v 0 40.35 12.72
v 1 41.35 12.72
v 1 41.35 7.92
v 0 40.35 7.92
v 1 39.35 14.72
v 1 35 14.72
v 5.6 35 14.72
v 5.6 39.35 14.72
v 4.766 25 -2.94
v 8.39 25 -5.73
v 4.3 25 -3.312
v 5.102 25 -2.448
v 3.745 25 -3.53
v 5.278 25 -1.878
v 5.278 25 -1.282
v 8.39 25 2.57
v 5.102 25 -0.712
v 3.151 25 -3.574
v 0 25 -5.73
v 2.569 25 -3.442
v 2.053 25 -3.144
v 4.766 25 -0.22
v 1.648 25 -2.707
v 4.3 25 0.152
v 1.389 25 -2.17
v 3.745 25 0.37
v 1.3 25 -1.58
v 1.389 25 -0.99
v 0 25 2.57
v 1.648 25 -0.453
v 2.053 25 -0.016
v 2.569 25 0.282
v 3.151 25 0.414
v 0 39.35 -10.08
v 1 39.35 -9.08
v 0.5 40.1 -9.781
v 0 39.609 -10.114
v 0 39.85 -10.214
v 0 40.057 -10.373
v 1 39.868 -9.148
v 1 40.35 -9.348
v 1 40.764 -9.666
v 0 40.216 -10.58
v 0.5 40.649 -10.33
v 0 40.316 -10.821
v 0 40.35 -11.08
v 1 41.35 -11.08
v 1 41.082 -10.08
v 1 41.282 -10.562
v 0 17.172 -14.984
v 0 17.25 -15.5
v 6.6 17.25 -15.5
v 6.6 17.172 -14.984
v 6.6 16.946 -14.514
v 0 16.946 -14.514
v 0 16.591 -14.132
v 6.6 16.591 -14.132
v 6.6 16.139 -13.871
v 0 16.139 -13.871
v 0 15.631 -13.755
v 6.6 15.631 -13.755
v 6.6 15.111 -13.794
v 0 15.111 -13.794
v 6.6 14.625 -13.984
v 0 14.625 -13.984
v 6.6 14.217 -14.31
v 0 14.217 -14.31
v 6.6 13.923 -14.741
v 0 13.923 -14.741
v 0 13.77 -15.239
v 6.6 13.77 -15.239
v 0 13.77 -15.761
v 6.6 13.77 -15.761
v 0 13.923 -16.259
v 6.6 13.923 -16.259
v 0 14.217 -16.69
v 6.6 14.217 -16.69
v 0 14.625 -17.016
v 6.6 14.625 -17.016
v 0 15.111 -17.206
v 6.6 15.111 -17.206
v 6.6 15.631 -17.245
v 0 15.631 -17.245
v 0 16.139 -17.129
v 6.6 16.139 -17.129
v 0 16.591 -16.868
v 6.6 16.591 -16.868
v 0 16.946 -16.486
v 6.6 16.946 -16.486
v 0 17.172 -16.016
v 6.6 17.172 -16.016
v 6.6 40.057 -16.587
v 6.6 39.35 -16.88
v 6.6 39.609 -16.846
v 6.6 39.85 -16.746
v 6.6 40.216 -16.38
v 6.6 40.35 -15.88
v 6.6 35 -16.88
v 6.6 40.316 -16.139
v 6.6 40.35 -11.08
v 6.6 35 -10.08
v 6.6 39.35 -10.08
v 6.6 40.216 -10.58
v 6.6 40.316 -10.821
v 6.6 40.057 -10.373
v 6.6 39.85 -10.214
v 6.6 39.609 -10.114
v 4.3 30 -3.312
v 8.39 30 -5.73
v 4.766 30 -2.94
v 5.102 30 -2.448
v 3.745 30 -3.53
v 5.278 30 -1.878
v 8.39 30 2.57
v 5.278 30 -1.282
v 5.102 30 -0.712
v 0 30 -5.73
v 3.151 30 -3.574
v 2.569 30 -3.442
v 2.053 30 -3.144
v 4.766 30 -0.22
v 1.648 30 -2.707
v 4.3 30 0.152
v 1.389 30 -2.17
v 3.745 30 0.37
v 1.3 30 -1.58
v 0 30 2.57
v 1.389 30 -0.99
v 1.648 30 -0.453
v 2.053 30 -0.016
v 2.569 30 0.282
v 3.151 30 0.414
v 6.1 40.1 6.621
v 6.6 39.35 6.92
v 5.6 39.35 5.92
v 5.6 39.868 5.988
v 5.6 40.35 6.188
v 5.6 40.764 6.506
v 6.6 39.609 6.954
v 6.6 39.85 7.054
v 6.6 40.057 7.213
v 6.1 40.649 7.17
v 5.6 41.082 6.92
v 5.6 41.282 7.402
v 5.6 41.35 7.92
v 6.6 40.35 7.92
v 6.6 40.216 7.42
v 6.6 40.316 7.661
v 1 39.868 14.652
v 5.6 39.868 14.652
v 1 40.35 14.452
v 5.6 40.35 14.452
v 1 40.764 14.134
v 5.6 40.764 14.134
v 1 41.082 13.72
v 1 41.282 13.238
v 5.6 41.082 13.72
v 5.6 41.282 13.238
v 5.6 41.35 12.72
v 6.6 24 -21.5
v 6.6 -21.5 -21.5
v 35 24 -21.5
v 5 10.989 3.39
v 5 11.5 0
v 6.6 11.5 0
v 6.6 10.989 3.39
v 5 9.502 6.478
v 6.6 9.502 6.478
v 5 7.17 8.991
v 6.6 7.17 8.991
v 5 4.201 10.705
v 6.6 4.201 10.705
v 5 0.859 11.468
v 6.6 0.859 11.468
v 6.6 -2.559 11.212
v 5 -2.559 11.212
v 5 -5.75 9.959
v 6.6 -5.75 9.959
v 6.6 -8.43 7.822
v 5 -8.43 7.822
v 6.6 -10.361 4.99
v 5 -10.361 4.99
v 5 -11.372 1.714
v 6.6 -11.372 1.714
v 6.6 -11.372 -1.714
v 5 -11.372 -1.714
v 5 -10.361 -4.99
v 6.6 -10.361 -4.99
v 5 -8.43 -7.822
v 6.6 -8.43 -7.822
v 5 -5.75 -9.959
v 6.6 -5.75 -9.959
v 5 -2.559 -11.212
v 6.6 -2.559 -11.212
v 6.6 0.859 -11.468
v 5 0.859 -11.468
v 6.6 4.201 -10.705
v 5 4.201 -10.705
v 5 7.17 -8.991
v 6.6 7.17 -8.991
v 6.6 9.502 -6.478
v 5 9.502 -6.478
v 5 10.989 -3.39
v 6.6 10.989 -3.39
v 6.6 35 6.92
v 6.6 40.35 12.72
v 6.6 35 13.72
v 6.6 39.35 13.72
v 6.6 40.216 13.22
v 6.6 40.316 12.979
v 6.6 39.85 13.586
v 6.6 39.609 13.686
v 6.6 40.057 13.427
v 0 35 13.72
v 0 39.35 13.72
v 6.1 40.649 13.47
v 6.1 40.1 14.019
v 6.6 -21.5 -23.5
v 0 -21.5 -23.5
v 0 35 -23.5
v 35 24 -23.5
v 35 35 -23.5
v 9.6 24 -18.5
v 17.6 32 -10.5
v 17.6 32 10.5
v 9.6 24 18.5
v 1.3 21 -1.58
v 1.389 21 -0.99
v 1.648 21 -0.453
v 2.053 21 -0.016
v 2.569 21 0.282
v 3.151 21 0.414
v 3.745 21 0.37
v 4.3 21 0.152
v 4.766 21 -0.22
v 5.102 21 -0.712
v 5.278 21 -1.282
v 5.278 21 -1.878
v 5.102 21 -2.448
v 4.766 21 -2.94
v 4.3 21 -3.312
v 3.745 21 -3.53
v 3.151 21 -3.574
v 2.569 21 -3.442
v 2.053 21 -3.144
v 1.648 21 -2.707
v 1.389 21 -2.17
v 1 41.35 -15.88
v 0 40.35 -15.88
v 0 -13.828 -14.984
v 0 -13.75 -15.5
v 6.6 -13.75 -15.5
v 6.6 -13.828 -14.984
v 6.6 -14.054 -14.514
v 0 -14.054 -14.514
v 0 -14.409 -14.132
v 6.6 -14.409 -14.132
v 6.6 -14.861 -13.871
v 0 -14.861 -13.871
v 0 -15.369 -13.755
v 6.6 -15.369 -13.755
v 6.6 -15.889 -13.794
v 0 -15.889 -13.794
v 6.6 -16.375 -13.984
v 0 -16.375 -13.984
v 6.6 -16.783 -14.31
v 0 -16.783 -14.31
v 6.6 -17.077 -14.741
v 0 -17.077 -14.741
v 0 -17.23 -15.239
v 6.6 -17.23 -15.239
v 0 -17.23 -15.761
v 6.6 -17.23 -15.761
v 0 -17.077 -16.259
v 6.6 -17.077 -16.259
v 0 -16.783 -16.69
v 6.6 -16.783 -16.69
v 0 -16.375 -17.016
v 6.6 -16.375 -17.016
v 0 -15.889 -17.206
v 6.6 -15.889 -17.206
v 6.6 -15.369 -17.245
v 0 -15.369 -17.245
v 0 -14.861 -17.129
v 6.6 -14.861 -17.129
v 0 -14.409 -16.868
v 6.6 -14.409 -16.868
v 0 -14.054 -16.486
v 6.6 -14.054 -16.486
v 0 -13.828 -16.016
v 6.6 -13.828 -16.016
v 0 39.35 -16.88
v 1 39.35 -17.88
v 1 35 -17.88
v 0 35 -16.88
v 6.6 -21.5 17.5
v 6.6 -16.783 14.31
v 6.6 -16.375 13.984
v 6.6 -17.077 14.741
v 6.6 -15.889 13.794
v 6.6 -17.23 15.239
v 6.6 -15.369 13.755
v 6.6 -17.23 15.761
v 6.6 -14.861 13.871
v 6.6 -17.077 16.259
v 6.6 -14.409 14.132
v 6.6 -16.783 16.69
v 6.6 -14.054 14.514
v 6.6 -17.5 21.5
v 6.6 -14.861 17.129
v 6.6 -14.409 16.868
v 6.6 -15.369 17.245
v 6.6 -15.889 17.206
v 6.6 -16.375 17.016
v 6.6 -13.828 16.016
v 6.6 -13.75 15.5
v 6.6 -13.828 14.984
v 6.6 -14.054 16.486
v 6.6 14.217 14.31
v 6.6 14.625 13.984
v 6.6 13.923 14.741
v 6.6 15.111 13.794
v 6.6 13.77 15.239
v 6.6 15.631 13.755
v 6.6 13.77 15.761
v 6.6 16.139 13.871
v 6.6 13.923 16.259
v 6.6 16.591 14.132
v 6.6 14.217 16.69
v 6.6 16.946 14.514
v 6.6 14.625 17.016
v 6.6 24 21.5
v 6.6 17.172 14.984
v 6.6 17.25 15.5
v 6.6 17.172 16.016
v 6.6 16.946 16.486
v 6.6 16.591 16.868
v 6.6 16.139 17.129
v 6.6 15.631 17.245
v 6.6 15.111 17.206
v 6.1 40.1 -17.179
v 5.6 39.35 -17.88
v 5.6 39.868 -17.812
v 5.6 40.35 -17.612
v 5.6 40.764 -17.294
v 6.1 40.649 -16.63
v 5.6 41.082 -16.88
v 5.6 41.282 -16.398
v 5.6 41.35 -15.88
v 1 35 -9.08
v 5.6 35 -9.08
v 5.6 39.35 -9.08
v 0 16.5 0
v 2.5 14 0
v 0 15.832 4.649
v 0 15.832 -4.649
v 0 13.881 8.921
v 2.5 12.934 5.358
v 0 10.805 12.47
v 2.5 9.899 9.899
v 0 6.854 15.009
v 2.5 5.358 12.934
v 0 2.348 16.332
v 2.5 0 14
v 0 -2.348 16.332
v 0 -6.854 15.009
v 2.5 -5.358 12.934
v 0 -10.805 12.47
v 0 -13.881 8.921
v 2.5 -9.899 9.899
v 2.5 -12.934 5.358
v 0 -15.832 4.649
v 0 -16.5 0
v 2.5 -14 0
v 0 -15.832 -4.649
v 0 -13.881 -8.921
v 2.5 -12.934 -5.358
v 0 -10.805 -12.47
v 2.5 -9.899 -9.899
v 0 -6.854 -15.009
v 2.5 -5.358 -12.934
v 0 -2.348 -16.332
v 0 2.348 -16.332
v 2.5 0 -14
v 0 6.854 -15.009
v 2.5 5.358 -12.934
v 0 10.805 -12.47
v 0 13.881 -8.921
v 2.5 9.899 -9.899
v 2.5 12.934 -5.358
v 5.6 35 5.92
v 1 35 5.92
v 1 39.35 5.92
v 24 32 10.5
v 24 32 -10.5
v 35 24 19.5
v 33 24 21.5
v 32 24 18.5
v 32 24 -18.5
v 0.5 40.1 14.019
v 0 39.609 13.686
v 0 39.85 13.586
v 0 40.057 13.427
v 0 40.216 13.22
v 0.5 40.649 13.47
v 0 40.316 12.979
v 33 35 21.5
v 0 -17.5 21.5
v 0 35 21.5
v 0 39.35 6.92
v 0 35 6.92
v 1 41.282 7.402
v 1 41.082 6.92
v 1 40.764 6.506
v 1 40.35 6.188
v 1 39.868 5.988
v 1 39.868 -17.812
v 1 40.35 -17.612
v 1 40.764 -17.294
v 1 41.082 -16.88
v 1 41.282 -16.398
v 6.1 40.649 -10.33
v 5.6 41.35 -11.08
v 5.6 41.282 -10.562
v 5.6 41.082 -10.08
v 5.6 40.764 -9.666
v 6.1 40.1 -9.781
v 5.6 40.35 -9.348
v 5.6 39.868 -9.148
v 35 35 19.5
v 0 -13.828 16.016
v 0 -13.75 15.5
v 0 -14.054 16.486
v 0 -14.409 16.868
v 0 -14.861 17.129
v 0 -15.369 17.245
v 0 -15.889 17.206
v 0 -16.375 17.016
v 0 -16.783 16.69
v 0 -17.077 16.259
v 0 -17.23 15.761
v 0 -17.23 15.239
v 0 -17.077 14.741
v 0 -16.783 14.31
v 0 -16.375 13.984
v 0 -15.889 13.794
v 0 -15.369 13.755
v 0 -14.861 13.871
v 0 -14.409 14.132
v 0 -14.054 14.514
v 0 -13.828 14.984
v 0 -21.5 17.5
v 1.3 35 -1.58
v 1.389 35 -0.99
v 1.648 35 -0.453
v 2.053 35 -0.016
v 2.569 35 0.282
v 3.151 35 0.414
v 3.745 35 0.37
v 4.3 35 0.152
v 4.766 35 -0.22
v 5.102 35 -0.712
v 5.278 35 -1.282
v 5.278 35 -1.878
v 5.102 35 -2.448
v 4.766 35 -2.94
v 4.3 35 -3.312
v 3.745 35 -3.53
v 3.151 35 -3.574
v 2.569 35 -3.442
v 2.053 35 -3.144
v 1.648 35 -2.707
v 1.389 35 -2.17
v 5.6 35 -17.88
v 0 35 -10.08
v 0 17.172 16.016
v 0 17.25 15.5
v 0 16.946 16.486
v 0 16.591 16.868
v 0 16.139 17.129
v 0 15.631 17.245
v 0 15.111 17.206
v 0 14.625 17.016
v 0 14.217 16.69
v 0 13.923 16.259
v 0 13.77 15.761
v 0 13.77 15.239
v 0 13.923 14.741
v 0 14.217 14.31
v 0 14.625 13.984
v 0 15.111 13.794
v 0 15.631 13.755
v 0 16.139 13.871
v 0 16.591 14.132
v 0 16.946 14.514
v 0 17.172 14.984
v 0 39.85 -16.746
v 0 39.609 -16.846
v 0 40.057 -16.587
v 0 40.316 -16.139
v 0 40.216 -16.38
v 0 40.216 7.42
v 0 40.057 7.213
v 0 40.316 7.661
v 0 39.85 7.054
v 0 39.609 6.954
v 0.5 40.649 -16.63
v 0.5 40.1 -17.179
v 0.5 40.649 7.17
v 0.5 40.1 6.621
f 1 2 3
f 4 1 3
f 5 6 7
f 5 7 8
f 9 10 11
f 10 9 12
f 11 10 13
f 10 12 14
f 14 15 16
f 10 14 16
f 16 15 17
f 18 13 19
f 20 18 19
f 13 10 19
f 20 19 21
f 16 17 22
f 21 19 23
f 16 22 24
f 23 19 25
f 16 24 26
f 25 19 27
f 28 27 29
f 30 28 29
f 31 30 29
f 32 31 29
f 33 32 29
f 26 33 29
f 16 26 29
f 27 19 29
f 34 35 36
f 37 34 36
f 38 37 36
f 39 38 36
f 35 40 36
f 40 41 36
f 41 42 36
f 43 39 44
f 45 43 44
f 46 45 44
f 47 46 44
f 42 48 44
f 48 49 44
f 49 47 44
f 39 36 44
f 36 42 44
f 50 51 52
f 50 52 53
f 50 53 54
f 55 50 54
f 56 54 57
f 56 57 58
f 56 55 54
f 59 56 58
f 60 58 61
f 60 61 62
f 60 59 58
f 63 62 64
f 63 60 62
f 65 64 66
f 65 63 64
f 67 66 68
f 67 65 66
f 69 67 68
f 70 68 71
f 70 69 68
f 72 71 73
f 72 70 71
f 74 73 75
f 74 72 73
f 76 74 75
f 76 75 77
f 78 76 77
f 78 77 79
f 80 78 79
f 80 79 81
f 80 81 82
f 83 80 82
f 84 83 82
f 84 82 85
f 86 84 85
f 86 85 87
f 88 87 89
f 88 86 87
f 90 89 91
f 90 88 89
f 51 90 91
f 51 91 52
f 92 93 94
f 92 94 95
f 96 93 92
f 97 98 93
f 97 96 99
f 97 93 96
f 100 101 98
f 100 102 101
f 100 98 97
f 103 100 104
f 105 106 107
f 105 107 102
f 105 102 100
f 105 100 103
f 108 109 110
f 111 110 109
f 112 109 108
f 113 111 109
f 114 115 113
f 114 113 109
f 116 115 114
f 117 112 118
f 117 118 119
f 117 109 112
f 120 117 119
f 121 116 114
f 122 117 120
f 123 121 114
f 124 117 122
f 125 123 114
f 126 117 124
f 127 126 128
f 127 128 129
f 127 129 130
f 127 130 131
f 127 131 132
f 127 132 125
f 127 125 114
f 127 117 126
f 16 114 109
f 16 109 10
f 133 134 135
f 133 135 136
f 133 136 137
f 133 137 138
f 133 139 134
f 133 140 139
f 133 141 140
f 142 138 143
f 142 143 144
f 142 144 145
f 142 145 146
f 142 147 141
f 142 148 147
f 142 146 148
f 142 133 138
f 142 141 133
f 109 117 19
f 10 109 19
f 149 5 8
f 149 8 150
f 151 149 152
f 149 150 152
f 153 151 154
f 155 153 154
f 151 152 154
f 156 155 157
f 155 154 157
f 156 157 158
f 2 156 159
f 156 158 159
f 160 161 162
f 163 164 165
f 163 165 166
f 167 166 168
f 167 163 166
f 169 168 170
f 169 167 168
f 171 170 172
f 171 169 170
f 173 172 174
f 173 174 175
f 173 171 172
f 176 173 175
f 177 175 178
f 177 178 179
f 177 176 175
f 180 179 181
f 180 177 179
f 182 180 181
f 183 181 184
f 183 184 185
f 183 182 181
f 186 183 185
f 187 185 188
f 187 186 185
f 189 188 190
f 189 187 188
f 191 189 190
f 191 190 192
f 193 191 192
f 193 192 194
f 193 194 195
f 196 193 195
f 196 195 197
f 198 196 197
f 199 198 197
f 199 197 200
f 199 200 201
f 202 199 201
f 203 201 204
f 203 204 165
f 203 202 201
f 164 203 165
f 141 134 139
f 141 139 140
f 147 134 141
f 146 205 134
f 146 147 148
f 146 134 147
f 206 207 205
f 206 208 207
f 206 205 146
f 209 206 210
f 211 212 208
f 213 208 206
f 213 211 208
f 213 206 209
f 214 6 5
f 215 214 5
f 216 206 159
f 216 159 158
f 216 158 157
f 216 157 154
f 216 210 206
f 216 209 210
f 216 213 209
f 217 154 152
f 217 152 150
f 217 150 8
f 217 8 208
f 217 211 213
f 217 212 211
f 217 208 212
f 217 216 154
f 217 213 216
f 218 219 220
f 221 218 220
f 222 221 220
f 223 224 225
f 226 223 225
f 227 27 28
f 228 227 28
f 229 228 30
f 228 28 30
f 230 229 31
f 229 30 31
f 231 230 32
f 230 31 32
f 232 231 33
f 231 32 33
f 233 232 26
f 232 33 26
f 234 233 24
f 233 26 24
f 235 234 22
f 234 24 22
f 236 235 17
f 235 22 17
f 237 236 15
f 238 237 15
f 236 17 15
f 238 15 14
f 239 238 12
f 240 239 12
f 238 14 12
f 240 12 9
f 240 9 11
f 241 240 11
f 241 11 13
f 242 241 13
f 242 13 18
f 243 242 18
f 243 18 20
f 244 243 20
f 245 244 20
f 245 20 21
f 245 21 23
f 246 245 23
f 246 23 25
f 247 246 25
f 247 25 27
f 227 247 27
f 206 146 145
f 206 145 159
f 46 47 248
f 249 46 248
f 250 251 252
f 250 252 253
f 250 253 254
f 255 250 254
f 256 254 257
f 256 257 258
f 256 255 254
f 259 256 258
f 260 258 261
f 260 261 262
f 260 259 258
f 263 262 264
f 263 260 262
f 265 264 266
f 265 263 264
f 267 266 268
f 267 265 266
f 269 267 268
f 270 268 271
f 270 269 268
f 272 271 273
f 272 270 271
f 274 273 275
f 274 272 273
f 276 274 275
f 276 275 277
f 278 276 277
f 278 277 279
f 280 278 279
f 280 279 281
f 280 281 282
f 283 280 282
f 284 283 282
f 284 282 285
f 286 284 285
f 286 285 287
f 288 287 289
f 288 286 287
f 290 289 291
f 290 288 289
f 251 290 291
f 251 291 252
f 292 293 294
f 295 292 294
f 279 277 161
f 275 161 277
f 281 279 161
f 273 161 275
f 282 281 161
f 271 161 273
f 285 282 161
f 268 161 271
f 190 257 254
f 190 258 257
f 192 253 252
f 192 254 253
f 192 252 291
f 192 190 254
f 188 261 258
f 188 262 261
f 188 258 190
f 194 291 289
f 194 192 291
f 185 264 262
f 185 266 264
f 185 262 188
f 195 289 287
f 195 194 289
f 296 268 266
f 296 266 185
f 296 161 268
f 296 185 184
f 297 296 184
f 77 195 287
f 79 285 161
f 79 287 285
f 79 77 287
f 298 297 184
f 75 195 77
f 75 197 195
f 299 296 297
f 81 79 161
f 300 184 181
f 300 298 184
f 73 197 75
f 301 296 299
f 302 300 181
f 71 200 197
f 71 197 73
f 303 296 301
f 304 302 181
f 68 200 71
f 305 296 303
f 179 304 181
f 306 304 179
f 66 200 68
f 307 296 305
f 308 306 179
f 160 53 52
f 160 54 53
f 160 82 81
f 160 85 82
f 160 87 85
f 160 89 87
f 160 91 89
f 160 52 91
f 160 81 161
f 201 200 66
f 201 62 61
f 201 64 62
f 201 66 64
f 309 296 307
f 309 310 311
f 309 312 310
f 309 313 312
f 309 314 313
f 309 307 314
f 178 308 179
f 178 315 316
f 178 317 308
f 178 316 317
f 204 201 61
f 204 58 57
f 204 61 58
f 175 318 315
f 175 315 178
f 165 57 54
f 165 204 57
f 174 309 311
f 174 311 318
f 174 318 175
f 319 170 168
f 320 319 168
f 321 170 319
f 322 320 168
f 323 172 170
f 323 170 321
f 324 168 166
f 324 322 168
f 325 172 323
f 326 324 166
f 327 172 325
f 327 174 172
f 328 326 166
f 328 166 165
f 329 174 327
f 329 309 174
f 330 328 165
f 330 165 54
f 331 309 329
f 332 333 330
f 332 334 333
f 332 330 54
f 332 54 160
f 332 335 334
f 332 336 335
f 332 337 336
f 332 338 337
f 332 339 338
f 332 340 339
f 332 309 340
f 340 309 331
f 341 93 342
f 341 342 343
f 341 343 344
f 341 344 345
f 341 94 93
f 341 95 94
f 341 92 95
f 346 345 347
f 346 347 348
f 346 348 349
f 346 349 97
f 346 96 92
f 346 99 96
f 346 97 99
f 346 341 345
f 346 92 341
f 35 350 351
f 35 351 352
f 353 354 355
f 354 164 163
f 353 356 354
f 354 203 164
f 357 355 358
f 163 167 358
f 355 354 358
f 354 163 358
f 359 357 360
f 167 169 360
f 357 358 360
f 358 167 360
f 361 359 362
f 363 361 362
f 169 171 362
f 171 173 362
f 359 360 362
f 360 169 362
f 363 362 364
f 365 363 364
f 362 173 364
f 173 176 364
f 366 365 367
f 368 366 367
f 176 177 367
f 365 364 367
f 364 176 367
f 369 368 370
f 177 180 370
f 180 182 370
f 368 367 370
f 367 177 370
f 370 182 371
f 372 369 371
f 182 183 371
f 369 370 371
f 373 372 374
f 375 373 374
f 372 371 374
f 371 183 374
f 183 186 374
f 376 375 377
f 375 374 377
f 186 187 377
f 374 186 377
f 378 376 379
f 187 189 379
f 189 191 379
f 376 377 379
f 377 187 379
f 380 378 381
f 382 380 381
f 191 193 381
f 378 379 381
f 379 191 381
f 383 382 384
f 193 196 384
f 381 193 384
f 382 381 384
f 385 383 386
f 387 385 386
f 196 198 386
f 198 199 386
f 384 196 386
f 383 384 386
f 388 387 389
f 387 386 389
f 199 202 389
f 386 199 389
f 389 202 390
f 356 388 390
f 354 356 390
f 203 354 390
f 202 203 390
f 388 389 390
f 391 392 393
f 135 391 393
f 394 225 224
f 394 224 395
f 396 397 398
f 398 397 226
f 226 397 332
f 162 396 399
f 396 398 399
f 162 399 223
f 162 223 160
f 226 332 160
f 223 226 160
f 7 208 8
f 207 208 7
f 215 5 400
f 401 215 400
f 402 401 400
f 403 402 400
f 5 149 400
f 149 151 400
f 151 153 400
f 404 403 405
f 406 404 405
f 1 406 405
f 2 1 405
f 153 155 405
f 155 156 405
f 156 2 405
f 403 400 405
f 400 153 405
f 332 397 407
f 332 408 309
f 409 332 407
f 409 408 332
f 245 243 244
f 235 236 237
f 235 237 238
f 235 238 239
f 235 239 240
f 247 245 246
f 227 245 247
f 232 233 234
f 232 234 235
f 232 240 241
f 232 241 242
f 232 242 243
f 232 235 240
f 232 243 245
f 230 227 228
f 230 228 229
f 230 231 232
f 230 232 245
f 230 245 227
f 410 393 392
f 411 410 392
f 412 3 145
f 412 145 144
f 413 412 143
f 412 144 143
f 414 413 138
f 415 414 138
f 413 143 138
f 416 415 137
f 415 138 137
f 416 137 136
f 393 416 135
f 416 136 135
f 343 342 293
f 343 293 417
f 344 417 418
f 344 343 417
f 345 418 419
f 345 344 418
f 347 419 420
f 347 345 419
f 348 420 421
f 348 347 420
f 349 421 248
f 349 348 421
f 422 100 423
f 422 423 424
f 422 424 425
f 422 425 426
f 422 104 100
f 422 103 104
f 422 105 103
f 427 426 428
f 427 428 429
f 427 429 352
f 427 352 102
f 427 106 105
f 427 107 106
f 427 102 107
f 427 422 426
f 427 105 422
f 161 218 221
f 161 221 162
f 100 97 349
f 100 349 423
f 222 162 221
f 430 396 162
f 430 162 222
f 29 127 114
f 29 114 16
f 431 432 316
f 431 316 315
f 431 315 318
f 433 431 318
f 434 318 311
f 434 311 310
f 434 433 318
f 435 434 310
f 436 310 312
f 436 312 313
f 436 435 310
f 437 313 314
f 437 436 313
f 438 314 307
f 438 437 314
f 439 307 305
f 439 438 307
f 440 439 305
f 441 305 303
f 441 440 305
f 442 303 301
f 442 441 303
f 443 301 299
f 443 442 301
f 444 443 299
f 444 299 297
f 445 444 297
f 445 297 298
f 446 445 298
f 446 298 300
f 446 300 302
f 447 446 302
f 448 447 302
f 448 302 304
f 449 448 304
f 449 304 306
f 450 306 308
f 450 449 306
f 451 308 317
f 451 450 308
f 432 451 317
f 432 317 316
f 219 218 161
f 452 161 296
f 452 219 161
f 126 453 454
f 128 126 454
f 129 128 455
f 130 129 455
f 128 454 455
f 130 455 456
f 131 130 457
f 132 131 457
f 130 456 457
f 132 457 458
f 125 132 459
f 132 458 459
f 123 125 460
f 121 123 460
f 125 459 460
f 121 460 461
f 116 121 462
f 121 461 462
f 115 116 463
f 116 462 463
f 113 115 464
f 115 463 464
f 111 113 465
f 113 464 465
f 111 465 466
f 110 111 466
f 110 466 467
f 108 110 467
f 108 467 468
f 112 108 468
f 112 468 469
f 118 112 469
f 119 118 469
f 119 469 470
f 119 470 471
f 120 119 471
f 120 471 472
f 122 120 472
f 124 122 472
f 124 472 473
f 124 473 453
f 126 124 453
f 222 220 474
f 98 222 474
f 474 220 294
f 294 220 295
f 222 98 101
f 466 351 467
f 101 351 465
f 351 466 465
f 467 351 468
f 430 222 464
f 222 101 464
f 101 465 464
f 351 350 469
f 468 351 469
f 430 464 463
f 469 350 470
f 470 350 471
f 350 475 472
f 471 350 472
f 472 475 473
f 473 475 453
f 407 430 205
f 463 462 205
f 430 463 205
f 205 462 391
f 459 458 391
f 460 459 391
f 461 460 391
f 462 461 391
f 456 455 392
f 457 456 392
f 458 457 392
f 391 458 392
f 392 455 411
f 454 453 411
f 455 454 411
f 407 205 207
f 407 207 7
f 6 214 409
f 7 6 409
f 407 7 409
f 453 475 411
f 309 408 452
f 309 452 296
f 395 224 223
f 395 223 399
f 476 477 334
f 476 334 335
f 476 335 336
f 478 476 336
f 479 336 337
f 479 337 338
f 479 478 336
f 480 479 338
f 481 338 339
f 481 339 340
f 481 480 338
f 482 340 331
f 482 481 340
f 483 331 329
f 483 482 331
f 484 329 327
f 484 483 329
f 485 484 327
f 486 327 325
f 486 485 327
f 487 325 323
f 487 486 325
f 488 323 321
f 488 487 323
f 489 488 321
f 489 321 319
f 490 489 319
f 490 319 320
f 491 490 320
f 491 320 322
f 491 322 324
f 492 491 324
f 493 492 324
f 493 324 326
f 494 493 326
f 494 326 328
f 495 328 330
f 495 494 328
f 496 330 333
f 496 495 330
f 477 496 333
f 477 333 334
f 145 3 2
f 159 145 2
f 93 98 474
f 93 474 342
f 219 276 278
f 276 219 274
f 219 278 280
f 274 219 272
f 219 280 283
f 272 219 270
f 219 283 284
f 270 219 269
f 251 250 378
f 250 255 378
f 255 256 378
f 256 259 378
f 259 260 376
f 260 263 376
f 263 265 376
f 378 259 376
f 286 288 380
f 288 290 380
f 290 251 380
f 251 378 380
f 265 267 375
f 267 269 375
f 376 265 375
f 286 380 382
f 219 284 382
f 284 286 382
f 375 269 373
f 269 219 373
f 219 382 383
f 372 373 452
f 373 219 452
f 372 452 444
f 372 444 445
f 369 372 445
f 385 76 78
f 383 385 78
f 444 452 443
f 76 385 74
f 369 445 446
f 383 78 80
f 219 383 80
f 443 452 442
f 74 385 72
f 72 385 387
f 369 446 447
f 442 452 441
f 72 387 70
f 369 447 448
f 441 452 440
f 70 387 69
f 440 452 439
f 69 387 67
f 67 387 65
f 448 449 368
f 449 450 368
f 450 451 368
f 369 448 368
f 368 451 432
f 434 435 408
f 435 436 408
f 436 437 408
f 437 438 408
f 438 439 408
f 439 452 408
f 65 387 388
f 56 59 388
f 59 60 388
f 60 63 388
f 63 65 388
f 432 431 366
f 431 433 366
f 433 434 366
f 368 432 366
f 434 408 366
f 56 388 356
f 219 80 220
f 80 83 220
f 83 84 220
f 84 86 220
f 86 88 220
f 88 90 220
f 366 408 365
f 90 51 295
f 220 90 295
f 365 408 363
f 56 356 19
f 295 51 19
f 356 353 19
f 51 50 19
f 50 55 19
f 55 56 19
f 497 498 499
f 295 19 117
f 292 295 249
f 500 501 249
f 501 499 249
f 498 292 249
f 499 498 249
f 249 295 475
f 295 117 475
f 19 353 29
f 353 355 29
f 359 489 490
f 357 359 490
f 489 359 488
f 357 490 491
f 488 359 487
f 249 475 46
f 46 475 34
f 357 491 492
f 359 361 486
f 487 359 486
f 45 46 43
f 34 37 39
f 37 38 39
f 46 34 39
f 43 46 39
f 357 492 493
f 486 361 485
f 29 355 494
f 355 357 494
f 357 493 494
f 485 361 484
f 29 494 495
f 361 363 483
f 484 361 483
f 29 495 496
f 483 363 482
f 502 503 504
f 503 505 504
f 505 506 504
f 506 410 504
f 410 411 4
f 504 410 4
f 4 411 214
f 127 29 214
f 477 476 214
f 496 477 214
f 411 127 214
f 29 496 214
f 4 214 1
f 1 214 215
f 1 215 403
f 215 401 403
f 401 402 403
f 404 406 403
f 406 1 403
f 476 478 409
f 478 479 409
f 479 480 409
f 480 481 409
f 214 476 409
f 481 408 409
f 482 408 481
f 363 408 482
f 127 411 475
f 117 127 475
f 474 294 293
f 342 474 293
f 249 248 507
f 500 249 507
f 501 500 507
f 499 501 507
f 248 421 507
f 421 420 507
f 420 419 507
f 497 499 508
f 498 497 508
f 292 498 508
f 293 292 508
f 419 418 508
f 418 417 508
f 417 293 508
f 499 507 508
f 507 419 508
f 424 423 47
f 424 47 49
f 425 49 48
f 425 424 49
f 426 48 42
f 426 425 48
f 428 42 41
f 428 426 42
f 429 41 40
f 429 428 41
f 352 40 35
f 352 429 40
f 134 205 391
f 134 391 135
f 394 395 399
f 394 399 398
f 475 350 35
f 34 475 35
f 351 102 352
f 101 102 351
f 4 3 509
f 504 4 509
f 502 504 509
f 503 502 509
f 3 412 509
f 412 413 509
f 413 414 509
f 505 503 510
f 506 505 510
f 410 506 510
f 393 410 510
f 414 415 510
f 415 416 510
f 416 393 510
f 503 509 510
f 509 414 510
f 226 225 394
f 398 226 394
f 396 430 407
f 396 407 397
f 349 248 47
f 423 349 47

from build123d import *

# Parameters (mm, degrees)
F0_W      = 45.5
F0_H      = 2
F1_DEPTH  = 35
F0_H_2    = 43
F0_R      = 1.75
F0_R_2    = 11.5
F2_DEPTH  = 6.6
F0_W_2    = 6.35
F0_H_3    = 8.8
F3_DEPTH  = 6.6
F4_R      = 2
F5_DEPTH  = 14
F6_W      = 5
F6_H      = 8.3
F7_DEPTH  = 8.39
F8_SIZE2  = 28.4
F8_SIZE   = 45.5
F9_R      = 2
F10_SIZE  = 1
F11_SIZE  = 4
F12_SIZE  = 5
F13_W     = 22.4
F13_H     = 37
F14_DEPTH = 8
F15_SIZE  = 7.99999
F16_SIZE  = 2


# Not quite as in the source:
# - a fillet or chamfer is up to 0.001 mm smaller than in the source, because OpenCascade refuses the exact size


with BuildPart() as f1:
    # F0 (on Right) → F1 (new body)
    with BuildSketch(Plane.YZ):
        Polygon((35, 21.5), (24, 21.5), (24, -21.5), (24, -23.5), (35, -23.5), (35, -17.88), (35, -9.08), (35, 5.92), (35, 14.72), align=None)
        with Locations((1.25, -22.5)):
            Rectangle(F0_W, F0_H)
    extrude(amount=F1_DEPTH)

    # F0 (on Right) → F2 (join)
    with BuildSketch(Plane.YZ):
        with Locations((1.25, 0)):
            Rectangle(F0_W, F0_H_2)
        with Locations((-15.5, -15.5)):
            Circle(F0_R, mode=Mode.SUBTRACT)
        with Locations((15.5, -15.5)):
            Circle(F0_R, mode=Mode.SUBTRACT)
        Circle(F0_R_2, mode=Mode.SUBTRACT)
        with Locations((-15.5, 15.5)):
            Circle(F0_R, mode=Mode.SUBTRACT)
        with Locations((15.5, 15.5)):
            Circle(F0_R, mode=Mode.SUBTRACT)
    extrude(amount=F2_DEPTH)

    # F0 (on Right) → F3 (join)
    with BuildSketch(Plane.YZ):
        with Locations((38.175, 10.32)):
            Rectangle(F0_W_2, F0_H_3)
        with Locations((38.175, -13.48)):
            Rectangle(F0_W_2, F0_H_3)
    extrude(amount=F3_DEPTH)

    # F4 (on face) → F5 (cut)
    with BuildSketch(Plane(origin=(0, 35, 0), x_dir=(-1, 0, 0), z_dir=(0, 1, 0))):
        with Locations((-3.3, -1.58)):
            Circle(F4_R)
    extrude(amount=-F5_DEPTH, mode=Mode.SUBTRACT)

    # F6 (on face) → F7 (cut)
    with BuildSketch(Plane(origin=(0, 0, 0), x_dir=(0, -1, 0), z_dir=(-1, 0, 0))):
        with Locations((-27.5, -1.58)):
            Rectangle(F6_W, F6_H)
    extrude(amount=-F7_DEPTH, mode=Mode.SUBTRACT)

    # F8
    f8_edges = [f1.edges().sort_by_distance(p)[0] for p in [
        (35, -21.5, -22.5),
    ]]
    f8_side = f1.faces().sort_by_distance((35, 25.113055, -4.338737))[0]
    chamfer(f8_edges, length=F8_SIZE, length2=F8_SIZE2, reference=f8_side)

    # F9
    f9_edges = [f1.edges().sort_by_distance(p)[0] for p in [
        (3.3, 41.35, 14.72),
        (3.3, 41.35, 5.92),
        (3.3, 41.35, -9.08),
        (3.3, 41.35, -17.88),
    ]]
    fillet(f9_edges, radius=F9_R)

    # F10
    f10_edges = [f1.edges().sort_by_distance(p)[0] for p in [
        (0, 37.175, -9.08),
        (0, 37.175, 14.72),
        (6.6, 37.175, -17.88),
        (6.6, 37.175, 5.92),
    ]]
    chamfer(f10_edges, length=F10_SIZE)

    # F11
    f11_edges = [f1.edges().sort_by_distance(p)[0] for p in [
        (3.3, -21.5, 21.5),
    ]]
    chamfer(f11_edges, length=F11_SIZE)

    # F12
    f12_edges = [f1.edges().sort_by_distance(p)[0] for p in [
        (0, -11.5, 0),
    ]]
    chamfer(f12_edges, length=F12_SIZE)

    # F13 (on face) → F14 (cut)
    with BuildSketch(Plane.XZ.offset(-24)):
        with Locations((20.8, 0)):
            Rectangle(F13_W, F13_H)
    extrude(amount=-F14_DEPTH, mode=Mode.SUBTRACT)

    # F15 (size 8 in the source; OpenCascade refuses exactly that, so slightly less here)
    f15_edges = [f1.edges().sort_by_distance(p)[0] for p in [
        (20.8, 32, 18.5),
        (9.6, 32, 0),
        (20.8, 32, -18.5),
        (32, 32, 0),
    ]]
    chamfer(f15_edges, length=F15_SIZE)

    # F16
    f16_edges = [f1.edges().sort_by_distance(p)[0] for p in [
        (35, 29.5, 21.5),
    ]]
    chamfer(f16_edges, length=F16_SIZE)


solid = f1.part
